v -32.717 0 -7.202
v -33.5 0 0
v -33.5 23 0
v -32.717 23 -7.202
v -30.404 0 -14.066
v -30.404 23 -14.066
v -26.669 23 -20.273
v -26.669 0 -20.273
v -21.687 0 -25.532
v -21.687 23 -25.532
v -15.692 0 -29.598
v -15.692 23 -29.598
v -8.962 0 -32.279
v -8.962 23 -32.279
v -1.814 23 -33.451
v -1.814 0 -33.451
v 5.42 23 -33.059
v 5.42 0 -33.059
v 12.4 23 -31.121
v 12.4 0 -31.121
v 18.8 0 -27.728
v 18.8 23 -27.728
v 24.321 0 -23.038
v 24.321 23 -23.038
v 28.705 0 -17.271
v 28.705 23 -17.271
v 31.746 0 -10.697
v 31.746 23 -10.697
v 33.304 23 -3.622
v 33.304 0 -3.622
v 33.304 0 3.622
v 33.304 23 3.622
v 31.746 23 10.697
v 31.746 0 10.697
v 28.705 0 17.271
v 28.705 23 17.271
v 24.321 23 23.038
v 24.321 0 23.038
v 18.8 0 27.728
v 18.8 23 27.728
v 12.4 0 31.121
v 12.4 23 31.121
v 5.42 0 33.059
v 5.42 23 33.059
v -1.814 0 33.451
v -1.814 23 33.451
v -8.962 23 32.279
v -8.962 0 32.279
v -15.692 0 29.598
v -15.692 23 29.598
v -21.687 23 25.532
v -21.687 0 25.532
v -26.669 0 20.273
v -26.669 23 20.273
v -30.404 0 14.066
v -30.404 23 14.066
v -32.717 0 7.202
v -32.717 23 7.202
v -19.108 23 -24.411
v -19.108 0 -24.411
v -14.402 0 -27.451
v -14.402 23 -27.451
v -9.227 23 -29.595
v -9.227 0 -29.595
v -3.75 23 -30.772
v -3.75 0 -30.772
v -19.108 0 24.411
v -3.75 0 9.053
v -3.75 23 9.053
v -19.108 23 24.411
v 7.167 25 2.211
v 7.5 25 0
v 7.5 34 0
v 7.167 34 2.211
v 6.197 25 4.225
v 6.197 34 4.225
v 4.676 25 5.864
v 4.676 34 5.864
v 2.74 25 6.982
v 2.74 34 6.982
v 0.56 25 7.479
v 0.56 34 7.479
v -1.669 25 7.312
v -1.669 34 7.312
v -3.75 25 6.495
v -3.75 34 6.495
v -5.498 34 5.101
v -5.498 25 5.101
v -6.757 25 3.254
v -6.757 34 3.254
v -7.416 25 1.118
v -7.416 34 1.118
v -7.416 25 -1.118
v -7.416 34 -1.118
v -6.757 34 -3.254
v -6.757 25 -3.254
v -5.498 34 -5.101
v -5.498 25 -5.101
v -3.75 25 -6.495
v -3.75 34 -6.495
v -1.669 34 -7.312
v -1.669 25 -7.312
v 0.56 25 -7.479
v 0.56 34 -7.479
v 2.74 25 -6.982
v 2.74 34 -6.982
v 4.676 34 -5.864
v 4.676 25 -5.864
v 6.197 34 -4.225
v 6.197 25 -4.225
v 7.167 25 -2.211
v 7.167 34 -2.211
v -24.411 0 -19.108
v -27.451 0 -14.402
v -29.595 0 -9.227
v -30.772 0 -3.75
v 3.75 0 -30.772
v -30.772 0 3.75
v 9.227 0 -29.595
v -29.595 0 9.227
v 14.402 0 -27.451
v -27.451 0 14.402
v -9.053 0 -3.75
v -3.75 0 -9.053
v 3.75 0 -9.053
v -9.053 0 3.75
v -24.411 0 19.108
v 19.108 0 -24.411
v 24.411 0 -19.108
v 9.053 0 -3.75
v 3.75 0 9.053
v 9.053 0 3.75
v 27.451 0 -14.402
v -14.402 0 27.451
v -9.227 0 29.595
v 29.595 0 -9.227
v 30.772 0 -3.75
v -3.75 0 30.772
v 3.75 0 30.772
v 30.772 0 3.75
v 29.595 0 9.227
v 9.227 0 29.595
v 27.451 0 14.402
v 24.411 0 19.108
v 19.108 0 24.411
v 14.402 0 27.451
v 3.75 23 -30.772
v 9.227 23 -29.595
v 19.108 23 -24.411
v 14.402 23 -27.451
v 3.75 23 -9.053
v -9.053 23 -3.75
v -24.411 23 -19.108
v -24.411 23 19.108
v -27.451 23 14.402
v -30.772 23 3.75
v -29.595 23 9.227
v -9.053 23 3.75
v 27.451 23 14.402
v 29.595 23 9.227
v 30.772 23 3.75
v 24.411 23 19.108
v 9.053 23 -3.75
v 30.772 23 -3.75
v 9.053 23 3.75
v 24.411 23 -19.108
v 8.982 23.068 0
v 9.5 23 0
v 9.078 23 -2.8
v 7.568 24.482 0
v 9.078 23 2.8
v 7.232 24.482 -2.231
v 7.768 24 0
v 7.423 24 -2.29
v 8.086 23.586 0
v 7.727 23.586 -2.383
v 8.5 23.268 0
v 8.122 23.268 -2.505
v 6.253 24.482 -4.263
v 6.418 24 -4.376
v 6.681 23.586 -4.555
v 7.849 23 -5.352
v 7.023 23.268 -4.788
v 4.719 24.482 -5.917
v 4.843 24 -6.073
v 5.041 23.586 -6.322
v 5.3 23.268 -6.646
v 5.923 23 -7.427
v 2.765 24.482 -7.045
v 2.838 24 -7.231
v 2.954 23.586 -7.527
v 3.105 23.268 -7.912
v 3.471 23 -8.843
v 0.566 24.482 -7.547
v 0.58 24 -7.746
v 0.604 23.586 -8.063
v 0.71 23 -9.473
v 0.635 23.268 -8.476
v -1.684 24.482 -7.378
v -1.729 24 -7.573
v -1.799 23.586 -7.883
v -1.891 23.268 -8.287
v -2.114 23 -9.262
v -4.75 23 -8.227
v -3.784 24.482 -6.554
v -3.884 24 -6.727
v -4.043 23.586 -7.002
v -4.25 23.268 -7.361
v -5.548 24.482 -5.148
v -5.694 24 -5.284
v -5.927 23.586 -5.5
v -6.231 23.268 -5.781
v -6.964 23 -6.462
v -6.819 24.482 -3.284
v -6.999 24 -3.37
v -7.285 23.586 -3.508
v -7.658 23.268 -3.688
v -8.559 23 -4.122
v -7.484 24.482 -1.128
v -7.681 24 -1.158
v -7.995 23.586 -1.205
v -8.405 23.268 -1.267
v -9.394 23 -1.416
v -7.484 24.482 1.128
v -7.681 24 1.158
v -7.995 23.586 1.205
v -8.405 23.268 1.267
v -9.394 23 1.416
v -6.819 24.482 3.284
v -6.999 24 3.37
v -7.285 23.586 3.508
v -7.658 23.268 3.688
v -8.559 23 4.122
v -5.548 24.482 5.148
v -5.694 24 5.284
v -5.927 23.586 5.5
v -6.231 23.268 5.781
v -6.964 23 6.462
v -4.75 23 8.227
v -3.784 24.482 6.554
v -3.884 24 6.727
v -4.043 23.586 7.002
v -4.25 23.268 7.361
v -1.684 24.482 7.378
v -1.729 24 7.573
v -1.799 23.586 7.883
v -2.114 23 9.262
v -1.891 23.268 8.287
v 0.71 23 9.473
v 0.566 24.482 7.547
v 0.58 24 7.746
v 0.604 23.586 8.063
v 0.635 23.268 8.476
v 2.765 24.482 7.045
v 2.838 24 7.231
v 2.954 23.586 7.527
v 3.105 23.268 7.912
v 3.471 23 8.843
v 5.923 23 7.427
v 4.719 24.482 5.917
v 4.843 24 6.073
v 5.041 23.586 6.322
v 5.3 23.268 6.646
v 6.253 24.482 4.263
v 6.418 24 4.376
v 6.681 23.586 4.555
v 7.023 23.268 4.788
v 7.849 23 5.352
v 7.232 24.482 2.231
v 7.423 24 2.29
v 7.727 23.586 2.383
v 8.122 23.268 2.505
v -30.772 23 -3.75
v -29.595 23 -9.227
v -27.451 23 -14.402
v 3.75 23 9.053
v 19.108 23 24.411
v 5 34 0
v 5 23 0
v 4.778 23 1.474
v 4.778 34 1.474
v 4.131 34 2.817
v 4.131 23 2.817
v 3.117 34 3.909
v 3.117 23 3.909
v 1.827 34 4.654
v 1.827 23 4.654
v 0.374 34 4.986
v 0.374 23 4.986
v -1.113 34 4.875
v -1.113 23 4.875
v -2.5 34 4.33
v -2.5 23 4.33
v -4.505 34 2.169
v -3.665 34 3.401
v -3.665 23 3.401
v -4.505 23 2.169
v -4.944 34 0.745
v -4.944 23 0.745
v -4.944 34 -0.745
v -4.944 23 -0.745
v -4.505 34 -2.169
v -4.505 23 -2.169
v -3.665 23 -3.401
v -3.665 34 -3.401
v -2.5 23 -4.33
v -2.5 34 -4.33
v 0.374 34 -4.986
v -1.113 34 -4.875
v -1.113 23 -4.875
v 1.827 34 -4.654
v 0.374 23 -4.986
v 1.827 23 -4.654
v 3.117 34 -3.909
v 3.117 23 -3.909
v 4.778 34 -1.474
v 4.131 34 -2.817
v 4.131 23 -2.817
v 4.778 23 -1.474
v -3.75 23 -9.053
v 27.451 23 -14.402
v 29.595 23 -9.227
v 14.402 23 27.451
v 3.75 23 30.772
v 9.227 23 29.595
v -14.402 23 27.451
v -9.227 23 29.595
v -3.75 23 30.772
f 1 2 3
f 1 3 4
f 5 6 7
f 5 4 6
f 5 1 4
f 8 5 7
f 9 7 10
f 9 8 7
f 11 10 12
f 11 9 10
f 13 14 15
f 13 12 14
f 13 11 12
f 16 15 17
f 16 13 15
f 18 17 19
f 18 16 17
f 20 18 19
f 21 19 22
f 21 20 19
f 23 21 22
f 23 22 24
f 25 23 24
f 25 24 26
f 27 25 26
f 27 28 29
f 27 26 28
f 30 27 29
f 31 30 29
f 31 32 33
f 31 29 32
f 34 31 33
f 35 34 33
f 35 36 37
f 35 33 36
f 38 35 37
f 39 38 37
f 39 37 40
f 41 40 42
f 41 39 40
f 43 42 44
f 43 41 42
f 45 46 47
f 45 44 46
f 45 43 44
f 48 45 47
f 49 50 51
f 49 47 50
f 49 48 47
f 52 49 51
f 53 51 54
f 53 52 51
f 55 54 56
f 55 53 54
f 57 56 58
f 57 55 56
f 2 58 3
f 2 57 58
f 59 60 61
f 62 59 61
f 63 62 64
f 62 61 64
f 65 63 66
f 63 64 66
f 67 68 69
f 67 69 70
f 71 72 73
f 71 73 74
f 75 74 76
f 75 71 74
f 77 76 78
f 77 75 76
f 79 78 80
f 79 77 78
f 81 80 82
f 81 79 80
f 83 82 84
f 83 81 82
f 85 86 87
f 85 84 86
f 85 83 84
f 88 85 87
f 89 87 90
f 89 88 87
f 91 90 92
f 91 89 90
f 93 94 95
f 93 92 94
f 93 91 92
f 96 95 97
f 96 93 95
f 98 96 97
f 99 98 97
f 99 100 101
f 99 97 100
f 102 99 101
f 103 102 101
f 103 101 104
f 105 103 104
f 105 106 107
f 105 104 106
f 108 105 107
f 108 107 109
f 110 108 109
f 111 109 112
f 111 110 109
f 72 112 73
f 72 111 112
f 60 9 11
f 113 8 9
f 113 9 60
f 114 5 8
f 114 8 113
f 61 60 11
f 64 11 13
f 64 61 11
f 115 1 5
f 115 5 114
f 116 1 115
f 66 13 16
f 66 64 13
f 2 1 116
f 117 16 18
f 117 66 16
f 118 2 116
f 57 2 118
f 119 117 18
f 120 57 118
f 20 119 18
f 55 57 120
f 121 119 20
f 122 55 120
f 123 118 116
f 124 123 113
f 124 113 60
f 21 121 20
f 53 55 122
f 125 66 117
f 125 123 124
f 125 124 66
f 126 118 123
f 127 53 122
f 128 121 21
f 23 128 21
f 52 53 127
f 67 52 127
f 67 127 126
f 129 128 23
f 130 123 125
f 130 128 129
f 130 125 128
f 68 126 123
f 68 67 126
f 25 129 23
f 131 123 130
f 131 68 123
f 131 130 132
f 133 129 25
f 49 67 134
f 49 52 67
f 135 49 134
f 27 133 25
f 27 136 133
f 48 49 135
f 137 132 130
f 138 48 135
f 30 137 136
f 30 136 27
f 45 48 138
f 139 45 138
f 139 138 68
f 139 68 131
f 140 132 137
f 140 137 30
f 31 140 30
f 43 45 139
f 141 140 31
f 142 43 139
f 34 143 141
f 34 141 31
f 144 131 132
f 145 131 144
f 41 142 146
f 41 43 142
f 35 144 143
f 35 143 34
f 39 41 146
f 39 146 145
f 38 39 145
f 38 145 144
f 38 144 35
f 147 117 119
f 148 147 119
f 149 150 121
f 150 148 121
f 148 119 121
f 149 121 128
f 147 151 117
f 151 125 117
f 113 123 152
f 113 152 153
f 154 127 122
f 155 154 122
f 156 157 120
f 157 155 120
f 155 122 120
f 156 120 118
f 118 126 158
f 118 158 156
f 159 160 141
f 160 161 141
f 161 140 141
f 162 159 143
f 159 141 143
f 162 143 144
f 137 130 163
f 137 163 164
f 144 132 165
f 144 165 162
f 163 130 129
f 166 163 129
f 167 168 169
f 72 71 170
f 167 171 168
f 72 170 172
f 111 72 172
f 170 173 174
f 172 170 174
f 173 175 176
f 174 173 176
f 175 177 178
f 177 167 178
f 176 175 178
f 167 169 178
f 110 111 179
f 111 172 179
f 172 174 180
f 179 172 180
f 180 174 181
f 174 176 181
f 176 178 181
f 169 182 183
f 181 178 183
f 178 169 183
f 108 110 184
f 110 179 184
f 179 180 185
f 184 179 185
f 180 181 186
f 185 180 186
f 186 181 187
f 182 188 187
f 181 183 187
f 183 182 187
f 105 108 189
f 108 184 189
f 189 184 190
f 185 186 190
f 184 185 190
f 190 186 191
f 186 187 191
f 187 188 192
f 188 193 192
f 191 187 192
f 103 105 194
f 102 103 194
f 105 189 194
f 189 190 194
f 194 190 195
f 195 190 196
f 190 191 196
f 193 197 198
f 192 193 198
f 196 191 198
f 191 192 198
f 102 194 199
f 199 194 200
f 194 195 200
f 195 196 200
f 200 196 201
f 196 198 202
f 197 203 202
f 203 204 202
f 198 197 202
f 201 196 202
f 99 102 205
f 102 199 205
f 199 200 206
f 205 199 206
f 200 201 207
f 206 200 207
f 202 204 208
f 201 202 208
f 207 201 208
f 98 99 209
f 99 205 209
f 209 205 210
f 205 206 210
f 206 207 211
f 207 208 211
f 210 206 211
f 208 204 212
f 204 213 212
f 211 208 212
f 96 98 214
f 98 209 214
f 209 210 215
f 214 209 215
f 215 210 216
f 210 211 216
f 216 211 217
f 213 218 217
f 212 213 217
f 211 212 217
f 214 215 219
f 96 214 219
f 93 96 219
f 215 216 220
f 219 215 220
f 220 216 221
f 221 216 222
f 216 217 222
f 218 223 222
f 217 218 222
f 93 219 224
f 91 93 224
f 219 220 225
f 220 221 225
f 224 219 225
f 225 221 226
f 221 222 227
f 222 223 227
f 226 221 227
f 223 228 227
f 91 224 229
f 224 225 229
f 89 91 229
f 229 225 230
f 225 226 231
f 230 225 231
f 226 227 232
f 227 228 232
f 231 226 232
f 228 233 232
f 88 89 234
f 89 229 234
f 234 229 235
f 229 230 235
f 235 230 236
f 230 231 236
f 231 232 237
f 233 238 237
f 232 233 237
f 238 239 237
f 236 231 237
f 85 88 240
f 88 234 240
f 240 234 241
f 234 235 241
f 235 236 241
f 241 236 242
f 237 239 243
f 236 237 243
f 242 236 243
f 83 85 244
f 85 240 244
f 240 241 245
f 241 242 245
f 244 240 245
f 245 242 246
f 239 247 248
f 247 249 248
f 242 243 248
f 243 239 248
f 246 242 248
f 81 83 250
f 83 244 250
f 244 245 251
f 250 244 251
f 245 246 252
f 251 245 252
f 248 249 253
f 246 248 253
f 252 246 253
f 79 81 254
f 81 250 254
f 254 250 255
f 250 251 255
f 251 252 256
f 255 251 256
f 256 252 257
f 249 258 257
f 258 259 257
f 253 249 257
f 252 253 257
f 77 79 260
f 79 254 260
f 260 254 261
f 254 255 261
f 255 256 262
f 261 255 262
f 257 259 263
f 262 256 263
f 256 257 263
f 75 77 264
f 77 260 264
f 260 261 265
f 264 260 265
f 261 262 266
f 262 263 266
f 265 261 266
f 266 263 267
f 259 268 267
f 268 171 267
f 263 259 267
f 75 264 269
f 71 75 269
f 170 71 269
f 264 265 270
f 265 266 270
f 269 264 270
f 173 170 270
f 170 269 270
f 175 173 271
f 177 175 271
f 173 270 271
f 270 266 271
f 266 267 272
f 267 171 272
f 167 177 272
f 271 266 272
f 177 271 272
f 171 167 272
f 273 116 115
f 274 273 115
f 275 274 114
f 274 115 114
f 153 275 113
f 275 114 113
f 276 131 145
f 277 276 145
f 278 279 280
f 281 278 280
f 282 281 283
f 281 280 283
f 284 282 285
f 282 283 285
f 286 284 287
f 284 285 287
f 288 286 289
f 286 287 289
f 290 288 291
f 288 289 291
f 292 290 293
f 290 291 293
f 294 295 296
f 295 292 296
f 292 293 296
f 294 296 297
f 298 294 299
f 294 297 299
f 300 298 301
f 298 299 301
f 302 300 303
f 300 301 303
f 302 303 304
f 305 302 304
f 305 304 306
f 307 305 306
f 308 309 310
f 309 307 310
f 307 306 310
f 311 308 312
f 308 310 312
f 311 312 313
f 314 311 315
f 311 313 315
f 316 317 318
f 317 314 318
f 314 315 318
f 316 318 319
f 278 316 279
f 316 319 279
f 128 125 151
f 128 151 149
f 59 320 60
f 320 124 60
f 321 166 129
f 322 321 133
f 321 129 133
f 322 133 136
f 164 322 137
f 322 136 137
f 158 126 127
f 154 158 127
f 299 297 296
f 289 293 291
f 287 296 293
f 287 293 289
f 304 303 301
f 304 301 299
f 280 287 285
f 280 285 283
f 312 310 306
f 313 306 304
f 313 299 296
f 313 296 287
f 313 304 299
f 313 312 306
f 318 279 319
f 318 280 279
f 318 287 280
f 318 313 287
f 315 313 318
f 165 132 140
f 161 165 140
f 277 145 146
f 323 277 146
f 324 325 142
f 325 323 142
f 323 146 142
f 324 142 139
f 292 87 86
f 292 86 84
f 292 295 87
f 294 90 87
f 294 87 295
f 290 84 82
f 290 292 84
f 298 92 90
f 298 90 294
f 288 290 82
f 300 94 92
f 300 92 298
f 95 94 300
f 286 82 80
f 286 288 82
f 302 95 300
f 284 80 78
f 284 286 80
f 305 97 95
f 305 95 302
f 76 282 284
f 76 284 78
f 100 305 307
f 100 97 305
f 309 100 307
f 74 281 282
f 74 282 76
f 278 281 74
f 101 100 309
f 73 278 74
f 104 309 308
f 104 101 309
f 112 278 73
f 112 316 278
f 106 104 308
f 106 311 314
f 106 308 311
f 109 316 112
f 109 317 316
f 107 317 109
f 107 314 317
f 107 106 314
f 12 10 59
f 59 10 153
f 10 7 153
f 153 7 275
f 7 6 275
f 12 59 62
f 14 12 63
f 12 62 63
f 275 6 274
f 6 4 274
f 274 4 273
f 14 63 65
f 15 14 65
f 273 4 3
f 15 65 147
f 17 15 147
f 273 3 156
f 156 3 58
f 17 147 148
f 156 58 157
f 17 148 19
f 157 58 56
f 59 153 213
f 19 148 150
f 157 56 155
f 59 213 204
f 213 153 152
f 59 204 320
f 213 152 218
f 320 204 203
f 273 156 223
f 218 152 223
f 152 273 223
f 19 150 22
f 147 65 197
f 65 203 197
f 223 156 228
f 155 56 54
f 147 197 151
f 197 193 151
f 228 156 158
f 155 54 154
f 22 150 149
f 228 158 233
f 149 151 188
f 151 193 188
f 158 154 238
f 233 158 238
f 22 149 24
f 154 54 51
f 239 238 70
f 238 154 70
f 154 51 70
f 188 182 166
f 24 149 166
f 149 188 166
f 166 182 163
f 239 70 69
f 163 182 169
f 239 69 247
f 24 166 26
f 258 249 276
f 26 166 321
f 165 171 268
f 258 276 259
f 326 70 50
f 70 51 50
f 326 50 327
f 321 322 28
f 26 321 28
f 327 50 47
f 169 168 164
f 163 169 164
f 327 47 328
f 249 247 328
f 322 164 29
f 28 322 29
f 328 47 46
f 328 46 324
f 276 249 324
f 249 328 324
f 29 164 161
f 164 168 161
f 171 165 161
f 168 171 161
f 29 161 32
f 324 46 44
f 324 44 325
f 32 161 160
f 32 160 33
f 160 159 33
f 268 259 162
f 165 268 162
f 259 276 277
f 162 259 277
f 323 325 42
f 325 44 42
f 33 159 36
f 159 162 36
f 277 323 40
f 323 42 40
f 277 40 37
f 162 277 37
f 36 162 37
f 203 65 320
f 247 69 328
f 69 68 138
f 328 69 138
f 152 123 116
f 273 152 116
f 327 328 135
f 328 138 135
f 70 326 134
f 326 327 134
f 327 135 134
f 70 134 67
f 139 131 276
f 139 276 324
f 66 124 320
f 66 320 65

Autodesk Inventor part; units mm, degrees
ref_plane "YZ Plane" through (0, 0, 0) normal (1, 0, 0) x (0, 1, 0)
ref_plane "XZ Plane" through (0, 0, 0) normal (0, 1, 0) x (-1, 0, 0)
ref_plane "XY Plane" through (0, 0, 0) normal (0, 0, 1) x (1, 0, 0)
sketch "Sketch1" plane through (0, 0, 0) normal (0, 1, 0) x (-1, 0, 0)
  circle A0 centre (0, 0) radius 31
  circle A1 centre (0, 0) radius 33.5
  dimension "d0" = 62
  dimension "d1" = 67
extrude "Extrusion1" add sketch "Sketch1" along normal blind 23
sketch "Sketch3" plane through (0, 23, 0) normal (0, 1, 0) x (1, 0, 0)
  circle A0 centre (0, 0) radius 31
hole "Hole1" at (0, 23, 0) direction (0, -1, 0) diameter 62 end through all
sketch "Sketch4" plane through (0, 23, 0) normal (0, 1, 0) x (1, 0, 0)
  circle A0 centre (0, 0) radius 9.4443
hole "Hole2" at (0, 23, 0) direction (0, -1, 0) diameter 62 end through all
sketch "Sketch5" plane through (0, 0, 0) normal (0, -1, 0) x (1, 0, 0)
  circle A0 centre (0, 0) radius 5
  line L0 (-5, 2.5) -> (-30.9738, 2.5)
  line L1 (-5, -2.5) -> (-30.9738, -2.5)
  line L2 (-4.3301, 2.5) -> (-5, 2.5)
  line L3 (-5, -2.5) -> (-4.3301, -2.5)
  dimension "d46" = 10
extrude "Extrusion3" add sketch "Sketch5" against normal blind 23
sketch "Sketch6" plane through (0, 23, 0) normal (0, 1, 0) x (1, 0, 0)
  circle A0 centre (0, 0) radius 7.5
  dimension "d49" = 15
extrude "Extrusion4" add sketch "Sketch6" against normal blind 23
sketch "Sketch7" plane through (0, 23, 0) normal (0, 1, 0) x (1, 0, 0)
  circle A0 centre (0, 0) radius 5
  circle A1 centre (0, 0) radius 31 projected
  circle A2 centre (0, 0) radius 7.5
  dimension "d52" = 10
extrude "Extrusion5" add sketch "Sketch7" along normal blind 11 contours A2
sketch "Sketch8" plane through (0, 0, 0) normal (0, -1, 0) x (1, 0, 0)
  circle A0 centre (0, 0) radius 7.5 projected
  line L0 (-6.4952, 3.75) -> (-30.7723, 3.75)
  circle A1 centre (0, 0) radius 31 projected
  line L1 (-6.4952, -3.75) -> (-30.7723, -3.75)
  line L2 (-1.9411, -7.2444) -> (-19.1077, -24.411)
  line L3 (-7.2444, -1.9411) -> (-24.411, -19.1077)
  line L4 (3.75, -6.4952) -> (3.75, -30.7723)
  line L5 (-3.75, -6.4952) -> (-3.75, -30.7723)
  line L6 (7.2444, -1.9411) -> (24.411, -19.1077)
  line L7 (1.9411, -7.2444) -> (19.1077, -24.411)
  line L8 (6.4952, 3.75) -> (30.7723, 3.75)
  line L9 (6.4952, -3.75) -> (30.7723, -3.75)
  line L10 (1.9411, 7.2444) -> (19.1077, 24.411)
  line L11 (7.2444, 1.9411) -> (24.411, 19.1077)
  line L12 (-3.75, 6.4952) -> (-3.75, 30.7723)
  line L13 (3.75, 6.4952) -> (3.75, 30.7723)
  line L14 (-7.2444, 1.9411) -> (-24.411, 19.1077)
  line L15 (-1.9411, 7.2444) -> (-19.1077, 24.411)
  point P0 (-9.0533, -3.75)
  point P1 (-3.75, -9.0533)
  point P2 (3.75, -9.0533)
  point P3 (9.0533, -3.75)
  point P4 (9.0533, 3.75)
  point P5 (3.75, 9.0533)
  point P6 (-3.75, 9.0533)
  point P7 (-9.0533, 3.75)
  dimension "d57" = 360
extrude "Extrusion6" add sketch "Sketch8" against normal blind 23 contours A0 L11 L8 A1 L9 L6 | A0 L8 L11 | L6 L9 A0 | A0 L13 L10 A1 L11 L8 | L9 L6 A1 L7 L4 A0 | A0 L10 L13 | L4 L7 A0 | A0 L15 L12 A1 L13 L10 | L7 L4 A1 L5 L2 A0 | A0 L12 L15 | L2 L5 A0 | A0 L0 L14 A1 L15 L12 | L5 L2 A1 L3 L1 A0 | A0 L14 L0 | L1 L3 A0 | A0 L3 L1 A1 L0 L14
sketch "Sketch9" plane through (0, 23, 0) normal (0, 1, 0) x (1, 0, 0)
  circle A0 centre (0, 0) radius 7.5 projected
  circle A1 centre (0, 0) radius 7.5 projected
  circle A2 centre (0, 0) radius 7.5
  circle A3 centre (0, 0) radius 30.9985
  point P0 (-30.7723, 3.75)
  point P1 (-30.7723, -3.75)
fillet "Fillet2" radius 2 1 edges at (-7.5, 23, 0)
properties part number "rueda de motol"
